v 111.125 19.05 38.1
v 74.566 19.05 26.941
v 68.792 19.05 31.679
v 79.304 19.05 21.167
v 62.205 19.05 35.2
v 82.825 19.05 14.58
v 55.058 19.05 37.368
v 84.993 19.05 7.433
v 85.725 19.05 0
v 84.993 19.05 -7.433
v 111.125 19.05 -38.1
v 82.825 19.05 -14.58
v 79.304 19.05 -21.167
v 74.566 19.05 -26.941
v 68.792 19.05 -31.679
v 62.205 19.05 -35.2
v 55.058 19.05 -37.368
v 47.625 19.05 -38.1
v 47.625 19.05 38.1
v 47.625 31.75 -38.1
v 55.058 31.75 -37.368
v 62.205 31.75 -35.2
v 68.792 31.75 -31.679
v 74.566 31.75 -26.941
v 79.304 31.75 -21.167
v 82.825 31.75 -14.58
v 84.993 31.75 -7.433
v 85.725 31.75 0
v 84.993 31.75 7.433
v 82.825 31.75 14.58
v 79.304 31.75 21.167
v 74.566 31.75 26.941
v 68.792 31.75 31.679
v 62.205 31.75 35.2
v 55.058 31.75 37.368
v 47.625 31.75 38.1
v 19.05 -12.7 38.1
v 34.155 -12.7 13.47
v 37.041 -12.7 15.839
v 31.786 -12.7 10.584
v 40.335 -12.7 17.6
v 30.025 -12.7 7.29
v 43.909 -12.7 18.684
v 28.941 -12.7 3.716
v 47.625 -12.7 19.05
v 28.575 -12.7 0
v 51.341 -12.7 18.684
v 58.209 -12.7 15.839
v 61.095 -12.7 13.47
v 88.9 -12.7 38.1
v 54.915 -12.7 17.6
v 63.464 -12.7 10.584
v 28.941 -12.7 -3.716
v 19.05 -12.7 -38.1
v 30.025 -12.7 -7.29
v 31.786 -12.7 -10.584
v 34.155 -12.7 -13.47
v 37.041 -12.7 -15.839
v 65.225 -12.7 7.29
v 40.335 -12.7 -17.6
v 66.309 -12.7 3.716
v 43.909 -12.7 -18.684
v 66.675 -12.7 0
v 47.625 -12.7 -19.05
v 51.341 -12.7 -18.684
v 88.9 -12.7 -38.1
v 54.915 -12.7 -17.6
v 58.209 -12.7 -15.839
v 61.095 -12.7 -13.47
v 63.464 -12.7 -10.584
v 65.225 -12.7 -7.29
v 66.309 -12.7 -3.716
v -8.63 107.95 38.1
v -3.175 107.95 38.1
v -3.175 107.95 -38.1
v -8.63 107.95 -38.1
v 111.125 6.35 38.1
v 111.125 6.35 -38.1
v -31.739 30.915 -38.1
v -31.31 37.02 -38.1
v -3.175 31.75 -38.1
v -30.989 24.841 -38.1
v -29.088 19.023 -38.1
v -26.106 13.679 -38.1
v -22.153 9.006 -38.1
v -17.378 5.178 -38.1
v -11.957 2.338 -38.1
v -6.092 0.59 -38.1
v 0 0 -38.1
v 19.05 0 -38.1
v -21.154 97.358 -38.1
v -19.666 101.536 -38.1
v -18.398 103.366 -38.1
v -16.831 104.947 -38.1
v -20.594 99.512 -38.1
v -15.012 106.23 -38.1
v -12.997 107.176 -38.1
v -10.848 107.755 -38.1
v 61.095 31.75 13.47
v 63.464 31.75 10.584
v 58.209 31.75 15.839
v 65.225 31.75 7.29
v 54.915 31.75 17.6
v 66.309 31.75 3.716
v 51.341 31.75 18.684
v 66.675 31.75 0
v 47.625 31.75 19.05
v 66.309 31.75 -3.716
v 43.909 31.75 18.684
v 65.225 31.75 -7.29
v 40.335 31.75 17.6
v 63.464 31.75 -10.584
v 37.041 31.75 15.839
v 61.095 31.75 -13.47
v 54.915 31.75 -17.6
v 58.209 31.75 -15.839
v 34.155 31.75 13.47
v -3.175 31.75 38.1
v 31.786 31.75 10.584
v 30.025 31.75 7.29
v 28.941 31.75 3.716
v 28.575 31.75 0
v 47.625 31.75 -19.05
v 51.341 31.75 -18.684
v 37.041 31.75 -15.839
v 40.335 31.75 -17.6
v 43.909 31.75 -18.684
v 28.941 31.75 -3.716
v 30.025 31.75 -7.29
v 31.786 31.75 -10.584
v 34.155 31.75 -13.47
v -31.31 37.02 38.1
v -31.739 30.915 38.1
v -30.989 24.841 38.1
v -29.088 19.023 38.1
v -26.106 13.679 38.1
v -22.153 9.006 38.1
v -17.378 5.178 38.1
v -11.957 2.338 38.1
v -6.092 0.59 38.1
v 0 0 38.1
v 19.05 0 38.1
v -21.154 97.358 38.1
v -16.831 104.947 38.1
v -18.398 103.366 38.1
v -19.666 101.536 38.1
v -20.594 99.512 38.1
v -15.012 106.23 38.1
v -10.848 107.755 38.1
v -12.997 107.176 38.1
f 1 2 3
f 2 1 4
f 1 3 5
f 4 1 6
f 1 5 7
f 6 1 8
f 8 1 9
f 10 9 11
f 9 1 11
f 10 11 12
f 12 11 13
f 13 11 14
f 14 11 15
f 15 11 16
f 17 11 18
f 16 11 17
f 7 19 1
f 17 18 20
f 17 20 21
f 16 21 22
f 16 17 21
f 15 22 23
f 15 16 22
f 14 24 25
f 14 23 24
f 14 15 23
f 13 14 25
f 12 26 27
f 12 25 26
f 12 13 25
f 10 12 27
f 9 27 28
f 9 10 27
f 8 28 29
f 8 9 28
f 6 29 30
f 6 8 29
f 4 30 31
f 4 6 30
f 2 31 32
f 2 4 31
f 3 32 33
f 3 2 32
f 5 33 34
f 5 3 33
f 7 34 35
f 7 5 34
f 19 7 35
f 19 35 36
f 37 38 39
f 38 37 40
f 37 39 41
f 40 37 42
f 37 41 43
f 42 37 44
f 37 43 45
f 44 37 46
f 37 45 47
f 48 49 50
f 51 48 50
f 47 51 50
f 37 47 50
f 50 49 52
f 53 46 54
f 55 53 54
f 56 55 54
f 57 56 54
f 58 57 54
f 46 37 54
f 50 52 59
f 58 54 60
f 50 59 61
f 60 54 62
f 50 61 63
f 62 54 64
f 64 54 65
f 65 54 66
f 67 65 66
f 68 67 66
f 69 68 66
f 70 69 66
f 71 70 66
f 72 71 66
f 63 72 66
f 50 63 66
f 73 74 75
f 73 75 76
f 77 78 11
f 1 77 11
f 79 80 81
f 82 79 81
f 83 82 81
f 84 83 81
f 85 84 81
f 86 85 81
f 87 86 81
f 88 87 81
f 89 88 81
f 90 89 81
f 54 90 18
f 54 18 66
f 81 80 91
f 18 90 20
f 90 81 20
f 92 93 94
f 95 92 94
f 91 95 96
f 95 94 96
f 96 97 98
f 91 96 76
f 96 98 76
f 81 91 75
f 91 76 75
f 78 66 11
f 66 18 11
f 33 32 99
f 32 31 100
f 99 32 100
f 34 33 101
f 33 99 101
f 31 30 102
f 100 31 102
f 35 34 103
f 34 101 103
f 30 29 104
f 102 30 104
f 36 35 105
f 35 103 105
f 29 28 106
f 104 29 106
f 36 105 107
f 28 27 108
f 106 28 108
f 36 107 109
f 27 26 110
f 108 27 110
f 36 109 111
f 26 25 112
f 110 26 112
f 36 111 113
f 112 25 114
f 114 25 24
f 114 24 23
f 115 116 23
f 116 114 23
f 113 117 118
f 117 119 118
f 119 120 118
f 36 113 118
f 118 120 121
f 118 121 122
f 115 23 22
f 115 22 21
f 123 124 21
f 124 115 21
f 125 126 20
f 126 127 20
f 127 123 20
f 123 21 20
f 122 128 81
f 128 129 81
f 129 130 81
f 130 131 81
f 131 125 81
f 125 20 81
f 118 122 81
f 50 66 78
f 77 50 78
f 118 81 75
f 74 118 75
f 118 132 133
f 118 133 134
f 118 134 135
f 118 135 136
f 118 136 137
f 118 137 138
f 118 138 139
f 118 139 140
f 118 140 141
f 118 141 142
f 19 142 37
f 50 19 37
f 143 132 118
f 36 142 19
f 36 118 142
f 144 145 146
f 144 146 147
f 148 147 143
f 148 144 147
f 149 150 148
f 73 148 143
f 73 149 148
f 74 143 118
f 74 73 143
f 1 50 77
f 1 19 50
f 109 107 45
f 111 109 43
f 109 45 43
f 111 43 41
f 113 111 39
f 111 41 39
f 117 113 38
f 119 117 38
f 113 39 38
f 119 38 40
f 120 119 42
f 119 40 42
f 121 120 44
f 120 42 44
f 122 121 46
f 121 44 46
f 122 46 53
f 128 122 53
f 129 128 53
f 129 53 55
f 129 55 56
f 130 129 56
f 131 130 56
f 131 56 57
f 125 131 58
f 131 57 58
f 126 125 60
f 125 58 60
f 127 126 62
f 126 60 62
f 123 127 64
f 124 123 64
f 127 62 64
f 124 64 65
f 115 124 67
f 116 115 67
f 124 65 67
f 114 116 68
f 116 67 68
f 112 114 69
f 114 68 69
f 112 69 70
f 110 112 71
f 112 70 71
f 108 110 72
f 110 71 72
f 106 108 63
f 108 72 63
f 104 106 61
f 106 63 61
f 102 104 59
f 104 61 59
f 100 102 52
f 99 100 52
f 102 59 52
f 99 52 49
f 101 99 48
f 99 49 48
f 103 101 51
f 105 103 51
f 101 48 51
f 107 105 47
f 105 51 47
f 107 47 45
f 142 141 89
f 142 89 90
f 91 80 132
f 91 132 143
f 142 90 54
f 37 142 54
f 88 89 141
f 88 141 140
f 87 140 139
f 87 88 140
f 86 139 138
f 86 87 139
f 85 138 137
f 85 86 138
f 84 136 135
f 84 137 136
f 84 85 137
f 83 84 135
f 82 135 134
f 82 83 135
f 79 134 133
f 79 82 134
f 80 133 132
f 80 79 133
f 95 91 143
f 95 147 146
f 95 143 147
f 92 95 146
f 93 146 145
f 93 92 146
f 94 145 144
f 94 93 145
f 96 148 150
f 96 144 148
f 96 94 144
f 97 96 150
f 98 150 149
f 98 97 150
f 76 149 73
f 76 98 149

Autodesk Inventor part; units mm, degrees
ref_plane "YZ Plane" through (0, 0, 0) normal (1, 0, 0) x (0, 1, 0)
ref_plane "XZ Plane" through (0, 0, 0) normal (0, 1, 0) x (-1, 0, 0)
ref_plane "XY Plane" through (0, 0, 0) normal (0, 0, 1) x (1, 0, 0)
sketch "Sketch1" plane through (0, 0, 0) normal (0, 0, 1) x (1, 0, 0)
  line L0 (0, 0) -> (19.05, 0)
  line L1 (19.05, 0) -> (19.05, -12.7)
  line L2 (19.05, -12.7) -> (88.9, -12.7)
  line L3 (111.125, 19.05) -> (47.625, 19.05)
  line L4 (47.625, 19.05) -> (47.625, 31.75)
  line L5 (47.625, 31.75) -> (-3.175, 31.75)
  line L6 (-3.175, 31.75) -> (-3.175, 107.95)
  line L7 (-3.175, 107.95) -> (-8.6301, 107.95)
  arc A0 (-8.6301, 107.95) -> (-21.154, 97.3579) centre (-8.6301, 95.25) ccw
  arc A1 (-31.3096, 37.0198) -> (0, 0) centre (0, 31.75) ccw
  line L8 (-31.3096, 37.0198) -> (-21.154, 97.3579)
  line L9 (88.9, -12.7) -> (111.125, 6.35)
  line L10 (111.125, 6.35) -> (111.125, 19.05)
  dimension "d29" = 114.3
  dimension "d30" = 120.65
  dimension "d31" = 19.05
  dimension "d32" = 69.85
  dimension "d33" = 50.8
  dimension "d35" = 31.75
  dimension "d36" = 76.2
  dimension "d37" = 12.7
  dimension "d38" = 31.75
  dimension "d39" = 12.7
  dimension "d40" = 12.7
extrude "Extrusion1" add sketch "Sketch1" along normal mid plane 76.2
sketch "Sketch2" plane through (47.625, 19.05, 38.1) normal (0, 1, 0) x (1, 0, 0)
  line L0 (0, 76.2) -> (0, 0) projected
  circle A0 centre (0, 38.1) radius 38.1
  point P0 (-47.625, 38.1)
extrude "Extrusion2" add sketch "Sketch2" along normal blind 12.7
hole "Hole1" at (47.625, 31.75, 0) direction (0, -1, 0) diameter 38.1 end through all
properties part number "HW 4 Part 3" material "Iron, Cast"
